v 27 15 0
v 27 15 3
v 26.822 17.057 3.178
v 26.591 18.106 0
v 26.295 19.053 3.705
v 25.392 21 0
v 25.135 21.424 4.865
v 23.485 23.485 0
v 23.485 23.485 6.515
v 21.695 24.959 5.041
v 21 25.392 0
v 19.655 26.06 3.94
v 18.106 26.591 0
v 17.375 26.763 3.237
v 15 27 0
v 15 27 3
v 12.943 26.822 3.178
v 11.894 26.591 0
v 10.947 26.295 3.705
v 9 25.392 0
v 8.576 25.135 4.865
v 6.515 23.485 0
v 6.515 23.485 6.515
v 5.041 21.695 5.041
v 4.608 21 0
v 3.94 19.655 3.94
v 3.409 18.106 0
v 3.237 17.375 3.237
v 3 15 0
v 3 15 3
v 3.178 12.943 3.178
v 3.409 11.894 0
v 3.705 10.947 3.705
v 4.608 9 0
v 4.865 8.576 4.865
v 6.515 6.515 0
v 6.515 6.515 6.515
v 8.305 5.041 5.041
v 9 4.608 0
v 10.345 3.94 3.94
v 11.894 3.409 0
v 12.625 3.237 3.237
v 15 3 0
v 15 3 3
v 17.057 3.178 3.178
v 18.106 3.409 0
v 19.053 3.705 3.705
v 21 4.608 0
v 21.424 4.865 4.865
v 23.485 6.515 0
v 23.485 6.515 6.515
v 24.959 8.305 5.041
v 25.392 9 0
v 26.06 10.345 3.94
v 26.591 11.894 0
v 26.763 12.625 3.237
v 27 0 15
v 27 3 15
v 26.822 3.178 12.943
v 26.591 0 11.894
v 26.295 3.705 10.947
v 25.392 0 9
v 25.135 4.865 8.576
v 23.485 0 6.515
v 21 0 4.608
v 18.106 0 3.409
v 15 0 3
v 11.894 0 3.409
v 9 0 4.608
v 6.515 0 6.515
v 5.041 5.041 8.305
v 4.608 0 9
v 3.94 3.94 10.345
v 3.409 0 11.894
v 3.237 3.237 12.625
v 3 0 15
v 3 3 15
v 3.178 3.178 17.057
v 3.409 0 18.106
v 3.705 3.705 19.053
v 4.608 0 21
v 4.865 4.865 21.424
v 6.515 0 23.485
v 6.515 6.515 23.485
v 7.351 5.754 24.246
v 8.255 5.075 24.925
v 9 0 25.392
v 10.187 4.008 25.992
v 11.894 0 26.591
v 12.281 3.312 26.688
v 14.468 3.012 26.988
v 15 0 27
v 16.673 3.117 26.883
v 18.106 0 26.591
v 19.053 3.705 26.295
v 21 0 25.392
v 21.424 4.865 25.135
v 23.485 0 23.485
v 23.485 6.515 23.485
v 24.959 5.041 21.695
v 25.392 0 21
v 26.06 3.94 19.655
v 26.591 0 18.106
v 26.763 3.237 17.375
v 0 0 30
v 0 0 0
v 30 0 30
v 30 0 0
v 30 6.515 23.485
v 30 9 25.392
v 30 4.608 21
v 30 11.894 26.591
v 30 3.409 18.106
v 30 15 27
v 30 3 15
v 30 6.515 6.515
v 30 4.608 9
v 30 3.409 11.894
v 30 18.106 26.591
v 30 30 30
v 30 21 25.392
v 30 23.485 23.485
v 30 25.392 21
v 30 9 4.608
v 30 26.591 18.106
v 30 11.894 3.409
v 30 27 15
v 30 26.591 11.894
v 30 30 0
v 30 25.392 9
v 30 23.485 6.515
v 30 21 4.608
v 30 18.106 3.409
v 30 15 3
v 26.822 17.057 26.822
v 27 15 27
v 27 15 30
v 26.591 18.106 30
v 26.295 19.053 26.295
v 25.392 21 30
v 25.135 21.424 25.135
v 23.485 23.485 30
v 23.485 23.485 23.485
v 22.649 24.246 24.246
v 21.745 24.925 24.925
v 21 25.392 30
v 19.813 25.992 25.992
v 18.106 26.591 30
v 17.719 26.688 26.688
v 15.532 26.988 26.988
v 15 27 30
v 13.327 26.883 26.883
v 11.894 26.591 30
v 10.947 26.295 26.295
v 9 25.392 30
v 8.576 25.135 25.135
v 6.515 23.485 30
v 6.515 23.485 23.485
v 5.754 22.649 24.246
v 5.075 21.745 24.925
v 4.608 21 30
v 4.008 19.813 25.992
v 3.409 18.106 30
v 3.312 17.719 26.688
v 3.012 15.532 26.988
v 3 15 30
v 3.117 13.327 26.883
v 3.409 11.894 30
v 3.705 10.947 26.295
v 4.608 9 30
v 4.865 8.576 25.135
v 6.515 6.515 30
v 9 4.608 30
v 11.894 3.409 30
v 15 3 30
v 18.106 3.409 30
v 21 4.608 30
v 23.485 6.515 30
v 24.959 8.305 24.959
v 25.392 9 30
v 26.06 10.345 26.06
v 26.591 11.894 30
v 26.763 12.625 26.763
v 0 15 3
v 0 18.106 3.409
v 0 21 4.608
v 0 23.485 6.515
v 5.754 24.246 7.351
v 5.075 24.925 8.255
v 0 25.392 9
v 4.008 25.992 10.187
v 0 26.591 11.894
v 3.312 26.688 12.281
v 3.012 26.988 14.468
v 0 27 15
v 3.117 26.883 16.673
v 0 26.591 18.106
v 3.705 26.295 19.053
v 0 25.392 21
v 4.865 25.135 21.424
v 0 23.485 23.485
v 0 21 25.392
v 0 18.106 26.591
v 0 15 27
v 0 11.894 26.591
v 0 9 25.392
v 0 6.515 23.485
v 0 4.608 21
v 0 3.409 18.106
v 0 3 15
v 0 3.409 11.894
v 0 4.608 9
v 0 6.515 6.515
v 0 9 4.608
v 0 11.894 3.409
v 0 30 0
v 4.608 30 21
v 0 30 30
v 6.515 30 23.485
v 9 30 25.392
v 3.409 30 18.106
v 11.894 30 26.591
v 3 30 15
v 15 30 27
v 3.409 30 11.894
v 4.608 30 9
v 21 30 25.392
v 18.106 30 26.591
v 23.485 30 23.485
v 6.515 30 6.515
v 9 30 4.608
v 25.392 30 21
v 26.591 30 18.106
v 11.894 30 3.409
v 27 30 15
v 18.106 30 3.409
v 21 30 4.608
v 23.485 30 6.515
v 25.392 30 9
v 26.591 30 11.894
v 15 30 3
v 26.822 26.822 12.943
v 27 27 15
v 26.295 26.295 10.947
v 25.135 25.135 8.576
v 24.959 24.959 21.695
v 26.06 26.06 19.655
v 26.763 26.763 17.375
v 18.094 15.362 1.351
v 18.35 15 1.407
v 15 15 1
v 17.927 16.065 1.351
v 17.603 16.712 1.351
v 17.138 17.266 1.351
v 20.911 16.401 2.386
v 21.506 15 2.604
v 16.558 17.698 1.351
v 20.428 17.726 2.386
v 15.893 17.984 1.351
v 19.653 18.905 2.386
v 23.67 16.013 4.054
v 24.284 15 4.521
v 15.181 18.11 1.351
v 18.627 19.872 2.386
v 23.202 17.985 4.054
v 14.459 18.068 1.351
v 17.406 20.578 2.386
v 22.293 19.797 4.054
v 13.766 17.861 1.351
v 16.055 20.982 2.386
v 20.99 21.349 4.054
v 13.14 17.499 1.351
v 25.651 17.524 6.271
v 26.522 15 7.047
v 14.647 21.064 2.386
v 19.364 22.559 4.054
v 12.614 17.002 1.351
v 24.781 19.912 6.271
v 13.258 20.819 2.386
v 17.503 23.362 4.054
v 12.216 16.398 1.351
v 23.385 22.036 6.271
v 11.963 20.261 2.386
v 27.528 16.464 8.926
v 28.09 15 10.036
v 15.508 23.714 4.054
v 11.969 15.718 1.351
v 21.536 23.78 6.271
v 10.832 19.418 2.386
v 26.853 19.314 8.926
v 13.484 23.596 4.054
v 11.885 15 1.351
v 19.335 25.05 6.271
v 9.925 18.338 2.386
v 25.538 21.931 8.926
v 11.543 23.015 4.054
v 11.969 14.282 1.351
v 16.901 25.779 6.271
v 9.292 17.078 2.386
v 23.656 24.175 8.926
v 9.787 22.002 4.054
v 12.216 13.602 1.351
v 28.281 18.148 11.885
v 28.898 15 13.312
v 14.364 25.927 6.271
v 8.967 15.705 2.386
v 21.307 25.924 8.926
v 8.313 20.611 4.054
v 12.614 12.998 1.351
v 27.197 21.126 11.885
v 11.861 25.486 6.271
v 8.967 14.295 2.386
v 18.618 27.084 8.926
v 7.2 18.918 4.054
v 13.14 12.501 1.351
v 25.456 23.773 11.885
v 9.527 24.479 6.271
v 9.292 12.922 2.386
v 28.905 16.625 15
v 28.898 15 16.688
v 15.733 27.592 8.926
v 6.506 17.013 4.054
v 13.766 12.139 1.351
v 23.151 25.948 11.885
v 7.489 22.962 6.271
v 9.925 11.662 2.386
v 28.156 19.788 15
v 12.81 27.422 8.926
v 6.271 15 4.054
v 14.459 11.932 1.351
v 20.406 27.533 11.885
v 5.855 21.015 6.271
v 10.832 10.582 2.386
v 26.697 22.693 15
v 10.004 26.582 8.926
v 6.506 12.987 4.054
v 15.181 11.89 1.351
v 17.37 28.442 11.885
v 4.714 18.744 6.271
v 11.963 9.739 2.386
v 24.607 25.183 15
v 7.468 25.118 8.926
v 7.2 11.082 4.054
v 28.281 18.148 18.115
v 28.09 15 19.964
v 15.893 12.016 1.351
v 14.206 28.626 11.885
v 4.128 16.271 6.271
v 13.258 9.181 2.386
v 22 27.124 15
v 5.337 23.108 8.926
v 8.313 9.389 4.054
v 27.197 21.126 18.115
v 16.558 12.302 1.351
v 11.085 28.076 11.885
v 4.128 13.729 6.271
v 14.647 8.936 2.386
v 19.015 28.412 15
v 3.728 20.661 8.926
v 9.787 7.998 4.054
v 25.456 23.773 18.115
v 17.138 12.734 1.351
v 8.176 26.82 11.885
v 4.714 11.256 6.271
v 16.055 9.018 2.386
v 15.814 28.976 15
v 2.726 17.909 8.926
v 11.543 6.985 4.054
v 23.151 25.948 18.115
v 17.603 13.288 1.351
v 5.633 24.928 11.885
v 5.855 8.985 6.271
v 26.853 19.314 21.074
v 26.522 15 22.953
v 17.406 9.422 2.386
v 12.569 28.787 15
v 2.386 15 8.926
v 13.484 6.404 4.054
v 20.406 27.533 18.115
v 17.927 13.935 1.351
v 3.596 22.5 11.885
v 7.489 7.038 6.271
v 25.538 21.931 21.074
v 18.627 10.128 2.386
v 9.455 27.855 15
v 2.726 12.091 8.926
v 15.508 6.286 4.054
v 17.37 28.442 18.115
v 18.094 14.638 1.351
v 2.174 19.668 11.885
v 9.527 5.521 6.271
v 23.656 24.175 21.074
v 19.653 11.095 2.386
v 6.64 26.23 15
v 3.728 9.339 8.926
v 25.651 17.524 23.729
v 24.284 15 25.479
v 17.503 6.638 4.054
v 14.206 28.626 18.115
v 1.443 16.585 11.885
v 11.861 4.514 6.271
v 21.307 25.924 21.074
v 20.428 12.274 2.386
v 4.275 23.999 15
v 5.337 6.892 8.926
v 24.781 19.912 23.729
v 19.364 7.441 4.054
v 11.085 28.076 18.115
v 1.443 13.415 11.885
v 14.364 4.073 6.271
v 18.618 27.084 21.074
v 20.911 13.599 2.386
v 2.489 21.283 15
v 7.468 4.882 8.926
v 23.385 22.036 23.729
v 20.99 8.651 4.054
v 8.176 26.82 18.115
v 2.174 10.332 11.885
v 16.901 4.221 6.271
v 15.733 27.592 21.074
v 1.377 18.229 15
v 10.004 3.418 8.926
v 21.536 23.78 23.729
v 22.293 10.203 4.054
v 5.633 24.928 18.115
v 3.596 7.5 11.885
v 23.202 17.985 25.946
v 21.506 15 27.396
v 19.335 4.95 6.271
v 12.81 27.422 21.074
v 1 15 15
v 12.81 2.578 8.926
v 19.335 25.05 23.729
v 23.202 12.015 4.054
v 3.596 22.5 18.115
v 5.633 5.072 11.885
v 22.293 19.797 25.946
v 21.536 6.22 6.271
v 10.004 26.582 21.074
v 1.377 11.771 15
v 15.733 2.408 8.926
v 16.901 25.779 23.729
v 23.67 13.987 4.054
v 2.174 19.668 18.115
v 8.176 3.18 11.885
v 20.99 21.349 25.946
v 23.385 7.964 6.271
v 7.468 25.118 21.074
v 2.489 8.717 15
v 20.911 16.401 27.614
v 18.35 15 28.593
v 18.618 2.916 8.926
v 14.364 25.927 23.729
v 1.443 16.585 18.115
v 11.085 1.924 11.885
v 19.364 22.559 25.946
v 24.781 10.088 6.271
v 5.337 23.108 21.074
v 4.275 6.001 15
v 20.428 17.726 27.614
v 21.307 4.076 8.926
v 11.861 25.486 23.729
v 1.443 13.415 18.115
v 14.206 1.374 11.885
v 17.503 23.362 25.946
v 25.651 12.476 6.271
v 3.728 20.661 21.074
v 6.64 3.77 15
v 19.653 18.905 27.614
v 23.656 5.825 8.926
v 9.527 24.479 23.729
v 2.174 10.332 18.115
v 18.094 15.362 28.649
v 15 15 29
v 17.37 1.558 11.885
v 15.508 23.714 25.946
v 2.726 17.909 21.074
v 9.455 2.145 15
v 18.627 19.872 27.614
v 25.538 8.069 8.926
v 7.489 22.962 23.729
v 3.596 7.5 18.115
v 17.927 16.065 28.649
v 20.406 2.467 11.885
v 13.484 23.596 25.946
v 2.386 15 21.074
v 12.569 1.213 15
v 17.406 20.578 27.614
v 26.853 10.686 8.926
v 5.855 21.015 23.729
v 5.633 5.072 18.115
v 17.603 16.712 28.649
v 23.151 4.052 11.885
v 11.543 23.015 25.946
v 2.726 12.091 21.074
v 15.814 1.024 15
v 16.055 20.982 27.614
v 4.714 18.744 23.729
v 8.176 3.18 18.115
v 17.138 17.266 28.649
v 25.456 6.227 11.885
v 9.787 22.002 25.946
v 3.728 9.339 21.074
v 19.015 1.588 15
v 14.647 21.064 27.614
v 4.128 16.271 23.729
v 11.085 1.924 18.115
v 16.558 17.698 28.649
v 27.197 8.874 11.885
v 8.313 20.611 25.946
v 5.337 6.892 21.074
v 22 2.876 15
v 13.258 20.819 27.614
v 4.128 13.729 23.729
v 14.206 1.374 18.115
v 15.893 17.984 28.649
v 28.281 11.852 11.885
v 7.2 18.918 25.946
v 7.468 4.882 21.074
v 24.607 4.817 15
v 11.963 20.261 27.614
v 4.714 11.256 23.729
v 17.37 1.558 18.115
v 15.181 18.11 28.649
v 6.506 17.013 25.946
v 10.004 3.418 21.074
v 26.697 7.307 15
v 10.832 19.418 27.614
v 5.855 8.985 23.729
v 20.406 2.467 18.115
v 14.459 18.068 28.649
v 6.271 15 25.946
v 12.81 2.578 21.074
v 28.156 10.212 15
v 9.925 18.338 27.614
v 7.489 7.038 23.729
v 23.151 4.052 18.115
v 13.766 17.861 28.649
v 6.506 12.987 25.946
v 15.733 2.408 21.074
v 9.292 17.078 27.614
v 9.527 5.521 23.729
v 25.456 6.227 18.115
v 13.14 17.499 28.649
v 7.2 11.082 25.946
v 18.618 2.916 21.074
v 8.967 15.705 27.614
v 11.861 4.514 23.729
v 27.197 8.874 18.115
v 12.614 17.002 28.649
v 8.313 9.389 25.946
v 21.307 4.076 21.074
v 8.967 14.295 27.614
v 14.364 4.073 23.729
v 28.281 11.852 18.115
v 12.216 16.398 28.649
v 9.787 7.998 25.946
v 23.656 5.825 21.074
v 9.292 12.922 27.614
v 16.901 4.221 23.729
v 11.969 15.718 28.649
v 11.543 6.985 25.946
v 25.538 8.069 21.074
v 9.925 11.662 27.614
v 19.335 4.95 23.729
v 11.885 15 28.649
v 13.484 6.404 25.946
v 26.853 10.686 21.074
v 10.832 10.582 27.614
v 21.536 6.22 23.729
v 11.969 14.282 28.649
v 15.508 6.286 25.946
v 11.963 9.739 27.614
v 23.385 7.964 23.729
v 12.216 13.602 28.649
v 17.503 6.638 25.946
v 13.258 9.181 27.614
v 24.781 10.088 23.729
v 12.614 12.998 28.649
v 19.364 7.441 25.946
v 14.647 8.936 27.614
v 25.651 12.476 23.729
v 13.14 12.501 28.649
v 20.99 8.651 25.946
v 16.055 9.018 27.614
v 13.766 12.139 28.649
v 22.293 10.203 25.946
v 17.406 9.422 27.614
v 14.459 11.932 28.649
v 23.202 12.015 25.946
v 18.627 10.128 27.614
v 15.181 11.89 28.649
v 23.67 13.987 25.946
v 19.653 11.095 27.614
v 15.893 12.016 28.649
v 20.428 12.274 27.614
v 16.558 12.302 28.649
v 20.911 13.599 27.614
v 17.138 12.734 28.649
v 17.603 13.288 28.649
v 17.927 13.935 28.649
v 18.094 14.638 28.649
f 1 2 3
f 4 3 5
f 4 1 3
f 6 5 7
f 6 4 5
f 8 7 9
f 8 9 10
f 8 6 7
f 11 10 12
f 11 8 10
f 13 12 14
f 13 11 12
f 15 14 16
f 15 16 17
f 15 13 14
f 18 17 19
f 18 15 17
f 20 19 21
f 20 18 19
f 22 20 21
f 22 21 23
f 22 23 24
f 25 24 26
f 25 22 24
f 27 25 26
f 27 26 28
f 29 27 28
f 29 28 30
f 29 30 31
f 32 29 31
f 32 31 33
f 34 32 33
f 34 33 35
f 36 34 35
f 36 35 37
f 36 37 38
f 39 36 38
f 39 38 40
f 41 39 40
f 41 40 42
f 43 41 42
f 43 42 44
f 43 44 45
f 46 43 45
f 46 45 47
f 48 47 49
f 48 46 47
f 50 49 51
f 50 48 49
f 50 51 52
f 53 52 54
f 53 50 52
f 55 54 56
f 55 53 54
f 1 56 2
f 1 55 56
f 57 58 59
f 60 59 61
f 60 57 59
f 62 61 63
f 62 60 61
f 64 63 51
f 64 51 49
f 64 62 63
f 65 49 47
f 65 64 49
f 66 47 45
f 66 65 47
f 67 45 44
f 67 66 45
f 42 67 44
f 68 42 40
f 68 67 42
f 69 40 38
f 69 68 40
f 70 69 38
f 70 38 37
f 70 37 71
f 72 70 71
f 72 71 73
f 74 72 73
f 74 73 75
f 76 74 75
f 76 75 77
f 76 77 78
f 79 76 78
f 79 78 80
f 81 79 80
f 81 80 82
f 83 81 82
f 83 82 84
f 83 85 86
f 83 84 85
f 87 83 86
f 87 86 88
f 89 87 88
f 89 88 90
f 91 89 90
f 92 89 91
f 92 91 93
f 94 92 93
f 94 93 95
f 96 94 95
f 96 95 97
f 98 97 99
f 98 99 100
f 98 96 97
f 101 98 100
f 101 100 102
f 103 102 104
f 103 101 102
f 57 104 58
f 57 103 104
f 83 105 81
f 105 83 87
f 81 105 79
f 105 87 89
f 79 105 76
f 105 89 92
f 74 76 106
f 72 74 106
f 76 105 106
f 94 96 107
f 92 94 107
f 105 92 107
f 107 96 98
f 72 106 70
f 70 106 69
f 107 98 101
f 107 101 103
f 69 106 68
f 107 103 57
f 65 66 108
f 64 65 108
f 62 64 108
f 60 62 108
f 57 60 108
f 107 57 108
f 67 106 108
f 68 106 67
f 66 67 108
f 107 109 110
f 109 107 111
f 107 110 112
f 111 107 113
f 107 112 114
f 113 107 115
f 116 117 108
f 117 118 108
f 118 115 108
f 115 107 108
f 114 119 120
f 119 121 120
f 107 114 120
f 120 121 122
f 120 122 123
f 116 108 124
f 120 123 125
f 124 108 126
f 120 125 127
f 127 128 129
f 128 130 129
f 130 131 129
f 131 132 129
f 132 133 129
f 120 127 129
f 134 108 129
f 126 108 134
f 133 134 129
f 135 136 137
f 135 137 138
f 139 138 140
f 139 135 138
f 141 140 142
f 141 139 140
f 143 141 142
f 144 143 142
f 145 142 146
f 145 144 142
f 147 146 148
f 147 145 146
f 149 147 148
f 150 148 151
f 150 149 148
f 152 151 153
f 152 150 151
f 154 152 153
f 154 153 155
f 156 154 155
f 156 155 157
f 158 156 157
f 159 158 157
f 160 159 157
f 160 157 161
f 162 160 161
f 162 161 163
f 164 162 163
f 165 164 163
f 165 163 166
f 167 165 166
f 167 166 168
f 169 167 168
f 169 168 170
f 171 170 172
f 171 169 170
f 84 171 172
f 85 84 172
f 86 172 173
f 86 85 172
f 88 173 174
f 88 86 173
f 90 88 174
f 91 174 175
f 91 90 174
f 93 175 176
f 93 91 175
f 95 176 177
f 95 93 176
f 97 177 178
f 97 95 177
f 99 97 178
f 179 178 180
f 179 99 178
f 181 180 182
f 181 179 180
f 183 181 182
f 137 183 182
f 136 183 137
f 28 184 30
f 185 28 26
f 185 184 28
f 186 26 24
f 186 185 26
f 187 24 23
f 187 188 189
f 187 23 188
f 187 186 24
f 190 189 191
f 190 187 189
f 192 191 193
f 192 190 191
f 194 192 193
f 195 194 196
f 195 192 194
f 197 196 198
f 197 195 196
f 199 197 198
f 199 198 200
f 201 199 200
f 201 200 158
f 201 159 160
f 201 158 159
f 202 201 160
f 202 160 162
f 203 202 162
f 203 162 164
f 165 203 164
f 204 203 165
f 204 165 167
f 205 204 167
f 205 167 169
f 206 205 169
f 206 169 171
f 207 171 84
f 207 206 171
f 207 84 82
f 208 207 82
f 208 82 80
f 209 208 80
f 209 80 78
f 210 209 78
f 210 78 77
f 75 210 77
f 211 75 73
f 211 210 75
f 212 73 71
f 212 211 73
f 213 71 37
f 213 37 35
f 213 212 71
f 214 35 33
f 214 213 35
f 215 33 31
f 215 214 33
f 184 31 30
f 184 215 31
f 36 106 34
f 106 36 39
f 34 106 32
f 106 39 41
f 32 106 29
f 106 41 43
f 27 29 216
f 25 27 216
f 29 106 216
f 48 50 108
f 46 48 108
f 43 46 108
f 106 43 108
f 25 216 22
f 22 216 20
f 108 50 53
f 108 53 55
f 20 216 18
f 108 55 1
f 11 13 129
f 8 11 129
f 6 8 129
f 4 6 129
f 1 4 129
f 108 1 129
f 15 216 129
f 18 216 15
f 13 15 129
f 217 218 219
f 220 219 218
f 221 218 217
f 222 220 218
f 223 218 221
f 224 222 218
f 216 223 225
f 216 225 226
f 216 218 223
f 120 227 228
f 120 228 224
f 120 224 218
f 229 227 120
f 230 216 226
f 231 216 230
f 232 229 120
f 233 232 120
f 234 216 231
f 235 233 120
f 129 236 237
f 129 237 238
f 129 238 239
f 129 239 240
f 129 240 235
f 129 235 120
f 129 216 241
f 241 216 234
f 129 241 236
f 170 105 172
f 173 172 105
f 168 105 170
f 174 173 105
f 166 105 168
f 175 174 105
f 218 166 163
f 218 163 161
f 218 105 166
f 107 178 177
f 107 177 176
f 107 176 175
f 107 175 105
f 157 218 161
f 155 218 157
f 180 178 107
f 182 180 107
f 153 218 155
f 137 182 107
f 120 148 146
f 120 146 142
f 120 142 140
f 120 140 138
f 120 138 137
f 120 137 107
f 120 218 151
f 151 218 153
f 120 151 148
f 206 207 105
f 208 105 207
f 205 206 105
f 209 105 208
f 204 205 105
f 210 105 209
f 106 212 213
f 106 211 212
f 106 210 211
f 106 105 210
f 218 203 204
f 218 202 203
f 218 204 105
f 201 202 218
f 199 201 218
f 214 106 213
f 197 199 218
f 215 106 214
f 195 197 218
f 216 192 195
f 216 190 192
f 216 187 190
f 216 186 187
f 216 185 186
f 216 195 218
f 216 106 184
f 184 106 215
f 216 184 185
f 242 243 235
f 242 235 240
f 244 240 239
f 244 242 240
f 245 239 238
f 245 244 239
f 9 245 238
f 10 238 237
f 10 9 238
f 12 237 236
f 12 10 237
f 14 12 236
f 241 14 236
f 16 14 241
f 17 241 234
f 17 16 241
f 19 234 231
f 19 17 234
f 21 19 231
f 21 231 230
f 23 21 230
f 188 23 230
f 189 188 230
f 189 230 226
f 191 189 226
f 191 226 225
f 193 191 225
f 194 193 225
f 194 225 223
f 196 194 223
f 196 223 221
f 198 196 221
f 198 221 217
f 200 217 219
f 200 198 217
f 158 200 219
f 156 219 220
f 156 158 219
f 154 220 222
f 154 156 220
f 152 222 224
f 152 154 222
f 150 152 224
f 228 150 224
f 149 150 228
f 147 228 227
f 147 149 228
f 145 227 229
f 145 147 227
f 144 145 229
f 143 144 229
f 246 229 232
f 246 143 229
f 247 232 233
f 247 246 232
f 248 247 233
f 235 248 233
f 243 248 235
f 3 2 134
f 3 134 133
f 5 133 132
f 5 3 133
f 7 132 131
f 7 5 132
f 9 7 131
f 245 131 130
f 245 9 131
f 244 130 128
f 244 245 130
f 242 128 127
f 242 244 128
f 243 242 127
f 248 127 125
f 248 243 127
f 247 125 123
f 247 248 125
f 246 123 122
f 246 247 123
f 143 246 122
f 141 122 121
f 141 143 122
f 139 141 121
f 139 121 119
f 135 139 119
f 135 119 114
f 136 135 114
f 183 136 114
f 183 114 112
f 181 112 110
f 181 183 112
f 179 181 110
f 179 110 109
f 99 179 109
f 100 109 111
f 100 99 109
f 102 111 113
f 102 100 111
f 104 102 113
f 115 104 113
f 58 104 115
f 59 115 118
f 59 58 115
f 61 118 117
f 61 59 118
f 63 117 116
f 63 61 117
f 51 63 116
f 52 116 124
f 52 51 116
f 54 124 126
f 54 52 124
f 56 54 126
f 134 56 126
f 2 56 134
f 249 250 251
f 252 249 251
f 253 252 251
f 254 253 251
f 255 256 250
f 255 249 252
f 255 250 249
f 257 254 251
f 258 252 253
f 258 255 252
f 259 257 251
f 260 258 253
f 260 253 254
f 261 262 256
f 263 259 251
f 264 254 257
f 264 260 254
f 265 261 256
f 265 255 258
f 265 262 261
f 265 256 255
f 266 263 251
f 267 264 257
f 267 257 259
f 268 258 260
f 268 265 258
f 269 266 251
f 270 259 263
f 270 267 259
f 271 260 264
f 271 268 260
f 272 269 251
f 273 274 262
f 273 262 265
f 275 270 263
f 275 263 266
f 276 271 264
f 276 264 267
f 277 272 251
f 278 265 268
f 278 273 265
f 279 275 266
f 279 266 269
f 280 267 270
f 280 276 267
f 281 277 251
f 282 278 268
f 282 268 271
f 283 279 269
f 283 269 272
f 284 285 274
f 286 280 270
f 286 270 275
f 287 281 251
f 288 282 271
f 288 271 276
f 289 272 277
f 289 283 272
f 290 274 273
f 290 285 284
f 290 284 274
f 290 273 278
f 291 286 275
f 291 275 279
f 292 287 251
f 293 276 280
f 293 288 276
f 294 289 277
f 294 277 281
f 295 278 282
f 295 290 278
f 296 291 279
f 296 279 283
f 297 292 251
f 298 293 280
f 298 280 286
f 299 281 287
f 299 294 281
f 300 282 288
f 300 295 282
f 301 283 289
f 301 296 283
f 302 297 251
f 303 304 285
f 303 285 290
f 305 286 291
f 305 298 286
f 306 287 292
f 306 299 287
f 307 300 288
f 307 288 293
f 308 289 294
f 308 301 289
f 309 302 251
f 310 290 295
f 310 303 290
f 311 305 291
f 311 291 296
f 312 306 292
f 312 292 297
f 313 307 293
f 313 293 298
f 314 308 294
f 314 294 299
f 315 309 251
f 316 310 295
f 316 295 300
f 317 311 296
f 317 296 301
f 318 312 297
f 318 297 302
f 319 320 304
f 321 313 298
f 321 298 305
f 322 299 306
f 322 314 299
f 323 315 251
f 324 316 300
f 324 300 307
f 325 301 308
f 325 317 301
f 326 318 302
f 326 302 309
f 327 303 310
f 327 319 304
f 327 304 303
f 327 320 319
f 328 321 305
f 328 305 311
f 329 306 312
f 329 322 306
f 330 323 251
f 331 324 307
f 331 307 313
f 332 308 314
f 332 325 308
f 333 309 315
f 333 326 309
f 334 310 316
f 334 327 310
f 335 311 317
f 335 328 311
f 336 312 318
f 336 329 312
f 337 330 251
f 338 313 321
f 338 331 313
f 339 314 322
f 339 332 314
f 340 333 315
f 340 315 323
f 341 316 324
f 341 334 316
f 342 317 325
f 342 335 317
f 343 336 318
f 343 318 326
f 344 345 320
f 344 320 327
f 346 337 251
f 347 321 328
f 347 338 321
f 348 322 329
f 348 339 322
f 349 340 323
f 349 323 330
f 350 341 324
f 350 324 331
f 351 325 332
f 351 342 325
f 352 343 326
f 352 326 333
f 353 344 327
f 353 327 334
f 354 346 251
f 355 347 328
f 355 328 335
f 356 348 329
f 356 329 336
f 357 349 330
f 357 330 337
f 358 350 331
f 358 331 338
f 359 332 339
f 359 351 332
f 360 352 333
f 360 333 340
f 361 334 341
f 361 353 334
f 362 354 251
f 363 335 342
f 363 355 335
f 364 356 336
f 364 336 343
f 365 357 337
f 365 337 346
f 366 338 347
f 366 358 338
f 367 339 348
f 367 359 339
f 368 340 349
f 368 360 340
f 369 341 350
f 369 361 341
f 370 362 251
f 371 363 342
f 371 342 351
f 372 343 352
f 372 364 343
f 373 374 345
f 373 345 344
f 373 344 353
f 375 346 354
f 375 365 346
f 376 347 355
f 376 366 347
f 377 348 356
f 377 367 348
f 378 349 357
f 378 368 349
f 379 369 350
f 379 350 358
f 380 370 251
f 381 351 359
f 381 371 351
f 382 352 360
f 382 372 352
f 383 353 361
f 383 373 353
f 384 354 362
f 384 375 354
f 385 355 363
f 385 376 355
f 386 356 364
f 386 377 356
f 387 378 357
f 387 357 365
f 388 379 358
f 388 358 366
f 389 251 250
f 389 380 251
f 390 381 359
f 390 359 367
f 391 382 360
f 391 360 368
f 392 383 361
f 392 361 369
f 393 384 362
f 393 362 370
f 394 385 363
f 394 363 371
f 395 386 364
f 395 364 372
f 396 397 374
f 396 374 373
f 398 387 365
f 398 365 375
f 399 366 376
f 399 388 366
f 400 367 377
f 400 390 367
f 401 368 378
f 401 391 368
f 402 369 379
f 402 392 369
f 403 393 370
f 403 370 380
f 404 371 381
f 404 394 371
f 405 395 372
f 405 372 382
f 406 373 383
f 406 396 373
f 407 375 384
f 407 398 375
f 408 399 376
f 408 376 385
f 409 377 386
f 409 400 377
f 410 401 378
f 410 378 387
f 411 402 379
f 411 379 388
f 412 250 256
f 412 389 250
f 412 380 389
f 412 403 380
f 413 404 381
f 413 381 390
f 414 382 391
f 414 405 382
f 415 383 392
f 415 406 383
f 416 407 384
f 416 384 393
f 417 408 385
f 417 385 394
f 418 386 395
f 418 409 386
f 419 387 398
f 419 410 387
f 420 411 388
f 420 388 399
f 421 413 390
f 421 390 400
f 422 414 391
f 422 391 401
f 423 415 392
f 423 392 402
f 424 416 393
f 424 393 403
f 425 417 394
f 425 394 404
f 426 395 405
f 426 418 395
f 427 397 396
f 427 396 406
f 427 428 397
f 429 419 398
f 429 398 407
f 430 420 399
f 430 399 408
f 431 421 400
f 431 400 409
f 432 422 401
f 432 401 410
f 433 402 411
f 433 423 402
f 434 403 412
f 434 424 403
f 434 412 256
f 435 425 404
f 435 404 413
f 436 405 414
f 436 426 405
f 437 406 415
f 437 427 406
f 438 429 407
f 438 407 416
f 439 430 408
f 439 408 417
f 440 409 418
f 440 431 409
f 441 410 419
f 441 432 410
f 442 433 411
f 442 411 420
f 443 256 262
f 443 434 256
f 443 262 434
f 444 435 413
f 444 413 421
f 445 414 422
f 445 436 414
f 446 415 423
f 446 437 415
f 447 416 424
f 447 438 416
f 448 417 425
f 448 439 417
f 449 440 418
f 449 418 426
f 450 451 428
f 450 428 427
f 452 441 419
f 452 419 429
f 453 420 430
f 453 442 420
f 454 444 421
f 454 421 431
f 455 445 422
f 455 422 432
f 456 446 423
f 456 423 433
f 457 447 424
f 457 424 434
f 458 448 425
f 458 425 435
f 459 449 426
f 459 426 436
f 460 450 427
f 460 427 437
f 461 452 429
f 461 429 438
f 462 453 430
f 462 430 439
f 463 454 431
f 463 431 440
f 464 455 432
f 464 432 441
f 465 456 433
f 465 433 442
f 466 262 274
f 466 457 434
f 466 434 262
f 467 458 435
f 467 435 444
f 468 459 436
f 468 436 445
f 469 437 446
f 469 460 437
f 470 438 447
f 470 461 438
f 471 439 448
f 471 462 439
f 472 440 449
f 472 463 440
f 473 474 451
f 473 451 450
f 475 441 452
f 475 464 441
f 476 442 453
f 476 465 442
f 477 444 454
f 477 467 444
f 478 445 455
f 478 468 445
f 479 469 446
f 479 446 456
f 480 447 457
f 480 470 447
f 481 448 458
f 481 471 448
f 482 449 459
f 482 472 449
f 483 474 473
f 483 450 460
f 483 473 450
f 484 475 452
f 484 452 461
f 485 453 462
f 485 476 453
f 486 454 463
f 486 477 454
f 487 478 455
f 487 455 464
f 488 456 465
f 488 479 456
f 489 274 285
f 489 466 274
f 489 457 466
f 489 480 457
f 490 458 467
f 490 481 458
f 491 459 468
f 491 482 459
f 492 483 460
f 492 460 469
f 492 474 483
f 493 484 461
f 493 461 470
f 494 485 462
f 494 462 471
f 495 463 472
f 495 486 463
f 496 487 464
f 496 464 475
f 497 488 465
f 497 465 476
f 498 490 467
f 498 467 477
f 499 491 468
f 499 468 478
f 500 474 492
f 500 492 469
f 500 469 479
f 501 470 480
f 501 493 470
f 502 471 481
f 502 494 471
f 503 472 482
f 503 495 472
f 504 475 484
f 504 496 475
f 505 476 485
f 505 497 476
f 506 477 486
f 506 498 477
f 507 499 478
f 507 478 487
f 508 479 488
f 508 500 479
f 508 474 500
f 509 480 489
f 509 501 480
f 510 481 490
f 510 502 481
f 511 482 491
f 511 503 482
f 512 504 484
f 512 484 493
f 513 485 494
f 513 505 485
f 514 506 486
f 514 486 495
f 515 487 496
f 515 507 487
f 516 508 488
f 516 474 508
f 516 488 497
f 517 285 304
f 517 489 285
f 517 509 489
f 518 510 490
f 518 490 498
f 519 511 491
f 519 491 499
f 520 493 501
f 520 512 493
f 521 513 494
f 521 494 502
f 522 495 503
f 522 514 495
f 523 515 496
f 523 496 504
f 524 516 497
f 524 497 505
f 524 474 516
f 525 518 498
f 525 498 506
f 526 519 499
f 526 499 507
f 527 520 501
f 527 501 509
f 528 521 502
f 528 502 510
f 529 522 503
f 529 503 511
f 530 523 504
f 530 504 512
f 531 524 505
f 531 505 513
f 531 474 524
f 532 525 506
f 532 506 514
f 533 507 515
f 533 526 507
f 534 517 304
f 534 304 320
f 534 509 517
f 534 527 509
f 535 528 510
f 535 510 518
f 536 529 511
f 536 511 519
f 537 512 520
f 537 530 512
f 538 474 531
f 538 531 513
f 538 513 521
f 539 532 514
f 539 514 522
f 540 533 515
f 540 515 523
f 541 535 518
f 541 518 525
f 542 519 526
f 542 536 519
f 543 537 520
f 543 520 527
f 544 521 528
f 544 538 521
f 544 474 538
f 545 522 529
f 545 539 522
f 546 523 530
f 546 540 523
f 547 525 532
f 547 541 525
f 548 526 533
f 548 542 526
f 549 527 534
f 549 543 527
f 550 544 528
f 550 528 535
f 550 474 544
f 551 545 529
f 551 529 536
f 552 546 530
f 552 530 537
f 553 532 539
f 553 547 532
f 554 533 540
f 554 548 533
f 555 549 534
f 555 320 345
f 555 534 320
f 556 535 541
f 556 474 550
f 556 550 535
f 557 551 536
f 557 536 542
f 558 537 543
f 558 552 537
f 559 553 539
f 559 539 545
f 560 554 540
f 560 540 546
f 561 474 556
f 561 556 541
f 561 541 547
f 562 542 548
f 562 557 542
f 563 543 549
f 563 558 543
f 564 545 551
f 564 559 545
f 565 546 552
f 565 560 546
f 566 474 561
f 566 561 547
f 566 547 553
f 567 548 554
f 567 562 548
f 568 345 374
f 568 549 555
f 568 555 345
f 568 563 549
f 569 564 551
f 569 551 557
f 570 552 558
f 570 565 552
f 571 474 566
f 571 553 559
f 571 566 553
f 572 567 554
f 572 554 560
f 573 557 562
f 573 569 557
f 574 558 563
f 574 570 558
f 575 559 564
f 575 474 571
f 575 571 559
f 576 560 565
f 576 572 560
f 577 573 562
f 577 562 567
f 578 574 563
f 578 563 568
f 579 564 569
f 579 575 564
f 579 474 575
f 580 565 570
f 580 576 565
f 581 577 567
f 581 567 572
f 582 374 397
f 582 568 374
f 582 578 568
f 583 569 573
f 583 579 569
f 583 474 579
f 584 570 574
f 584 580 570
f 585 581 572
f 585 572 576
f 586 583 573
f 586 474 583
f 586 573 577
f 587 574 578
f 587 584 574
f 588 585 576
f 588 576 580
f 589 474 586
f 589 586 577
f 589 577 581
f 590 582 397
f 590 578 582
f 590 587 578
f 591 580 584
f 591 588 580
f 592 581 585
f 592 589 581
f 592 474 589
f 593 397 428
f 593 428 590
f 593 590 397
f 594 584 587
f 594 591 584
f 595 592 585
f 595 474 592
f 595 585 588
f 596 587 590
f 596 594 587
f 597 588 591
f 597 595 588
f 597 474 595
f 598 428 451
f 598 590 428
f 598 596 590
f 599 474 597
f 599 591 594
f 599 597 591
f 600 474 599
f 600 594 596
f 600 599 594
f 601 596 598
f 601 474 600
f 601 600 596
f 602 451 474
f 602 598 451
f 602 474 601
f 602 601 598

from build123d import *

# Parameters (mm, degrees)
CYLINDER001_R     = 12
CYLINDER001_DEPTH = 35
CYLINDER002_R     = 12
CYLINDER002_DEPTH = 35
CYLINDER_R        = 12
CYLINDER_DEPTH    = 35
BOX_W             = 30
BOX_H             = 30
BOX_DEPTH         = 30


with BuildPart() as esfera001:
    # Sphere001 → Sphere001 (revolve)
    with BuildSketch(Plane(origin=(15, 15, 15), x_dir=(1, 0, 0), z_dir=(0, -1, 0))):
        with BuildLine():
            ThreePointArc((0, -14), (14, 0), (0, 14))
            Line((0, 14), (0, -14))
        make_face()
    revolve(axis=Axis((15, 15, 15), (0, 0, 1)))


with BuildPart() as cilindre001:
    # Cylinder001 → Cylinder001 (new body)
    with BuildSketch(Plane(origin=(-3, 15, 15), x_dir=(0, 0, -1), z_dir=(1, 0, 0))):
        Circle(CYLINDER001_R)
    extrude(amount=CYLINDER001_DEPTH)


with BuildPart() as cilindre002:
    # Cylinder002 → Cylinder002 (new body)
    with BuildSketch(Plane(origin=(15, -3, 15), x_dir=(1, 0, 0), z_dir=(0, 1, 0))):
        Circle(CYLINDER002_R)
    extrude(amount=CYLINDER002_DEPTH)


with BuildPart() as cilindre:
    # Cylinder → Cylinder (new body)
    with BuildSketch(Plane(origin=(15, 15, -1), x_dir=(1, 0, 0), z_dir=(0, 0, 1))):
        Circle(CYLINDER_R)
    extrude(amount=CYLINDER_DEPTH)


with BuildPart() as cut002:
    # Box → Box (new body)
    with BuildSketch(Plane.XY):
        with Locations((15, 15)):
            Rectangle(BOX_W, BOX_H)
    extrude(amount=BOX_DEPTH)

    # Cut: cut Cilindre
    add(cilindre.part, mode=Mode.SUBTRACT)

    # Cut001: cut Cilindre002
    add(cilindre002.part, mode=Mode.SUBTRACT)

    # Cut002: cut Cilindre001
    add(cilindre001.part, mode=Mode.SUBTRACT)


solid = Compound([esfera001.part, cut002.part])
